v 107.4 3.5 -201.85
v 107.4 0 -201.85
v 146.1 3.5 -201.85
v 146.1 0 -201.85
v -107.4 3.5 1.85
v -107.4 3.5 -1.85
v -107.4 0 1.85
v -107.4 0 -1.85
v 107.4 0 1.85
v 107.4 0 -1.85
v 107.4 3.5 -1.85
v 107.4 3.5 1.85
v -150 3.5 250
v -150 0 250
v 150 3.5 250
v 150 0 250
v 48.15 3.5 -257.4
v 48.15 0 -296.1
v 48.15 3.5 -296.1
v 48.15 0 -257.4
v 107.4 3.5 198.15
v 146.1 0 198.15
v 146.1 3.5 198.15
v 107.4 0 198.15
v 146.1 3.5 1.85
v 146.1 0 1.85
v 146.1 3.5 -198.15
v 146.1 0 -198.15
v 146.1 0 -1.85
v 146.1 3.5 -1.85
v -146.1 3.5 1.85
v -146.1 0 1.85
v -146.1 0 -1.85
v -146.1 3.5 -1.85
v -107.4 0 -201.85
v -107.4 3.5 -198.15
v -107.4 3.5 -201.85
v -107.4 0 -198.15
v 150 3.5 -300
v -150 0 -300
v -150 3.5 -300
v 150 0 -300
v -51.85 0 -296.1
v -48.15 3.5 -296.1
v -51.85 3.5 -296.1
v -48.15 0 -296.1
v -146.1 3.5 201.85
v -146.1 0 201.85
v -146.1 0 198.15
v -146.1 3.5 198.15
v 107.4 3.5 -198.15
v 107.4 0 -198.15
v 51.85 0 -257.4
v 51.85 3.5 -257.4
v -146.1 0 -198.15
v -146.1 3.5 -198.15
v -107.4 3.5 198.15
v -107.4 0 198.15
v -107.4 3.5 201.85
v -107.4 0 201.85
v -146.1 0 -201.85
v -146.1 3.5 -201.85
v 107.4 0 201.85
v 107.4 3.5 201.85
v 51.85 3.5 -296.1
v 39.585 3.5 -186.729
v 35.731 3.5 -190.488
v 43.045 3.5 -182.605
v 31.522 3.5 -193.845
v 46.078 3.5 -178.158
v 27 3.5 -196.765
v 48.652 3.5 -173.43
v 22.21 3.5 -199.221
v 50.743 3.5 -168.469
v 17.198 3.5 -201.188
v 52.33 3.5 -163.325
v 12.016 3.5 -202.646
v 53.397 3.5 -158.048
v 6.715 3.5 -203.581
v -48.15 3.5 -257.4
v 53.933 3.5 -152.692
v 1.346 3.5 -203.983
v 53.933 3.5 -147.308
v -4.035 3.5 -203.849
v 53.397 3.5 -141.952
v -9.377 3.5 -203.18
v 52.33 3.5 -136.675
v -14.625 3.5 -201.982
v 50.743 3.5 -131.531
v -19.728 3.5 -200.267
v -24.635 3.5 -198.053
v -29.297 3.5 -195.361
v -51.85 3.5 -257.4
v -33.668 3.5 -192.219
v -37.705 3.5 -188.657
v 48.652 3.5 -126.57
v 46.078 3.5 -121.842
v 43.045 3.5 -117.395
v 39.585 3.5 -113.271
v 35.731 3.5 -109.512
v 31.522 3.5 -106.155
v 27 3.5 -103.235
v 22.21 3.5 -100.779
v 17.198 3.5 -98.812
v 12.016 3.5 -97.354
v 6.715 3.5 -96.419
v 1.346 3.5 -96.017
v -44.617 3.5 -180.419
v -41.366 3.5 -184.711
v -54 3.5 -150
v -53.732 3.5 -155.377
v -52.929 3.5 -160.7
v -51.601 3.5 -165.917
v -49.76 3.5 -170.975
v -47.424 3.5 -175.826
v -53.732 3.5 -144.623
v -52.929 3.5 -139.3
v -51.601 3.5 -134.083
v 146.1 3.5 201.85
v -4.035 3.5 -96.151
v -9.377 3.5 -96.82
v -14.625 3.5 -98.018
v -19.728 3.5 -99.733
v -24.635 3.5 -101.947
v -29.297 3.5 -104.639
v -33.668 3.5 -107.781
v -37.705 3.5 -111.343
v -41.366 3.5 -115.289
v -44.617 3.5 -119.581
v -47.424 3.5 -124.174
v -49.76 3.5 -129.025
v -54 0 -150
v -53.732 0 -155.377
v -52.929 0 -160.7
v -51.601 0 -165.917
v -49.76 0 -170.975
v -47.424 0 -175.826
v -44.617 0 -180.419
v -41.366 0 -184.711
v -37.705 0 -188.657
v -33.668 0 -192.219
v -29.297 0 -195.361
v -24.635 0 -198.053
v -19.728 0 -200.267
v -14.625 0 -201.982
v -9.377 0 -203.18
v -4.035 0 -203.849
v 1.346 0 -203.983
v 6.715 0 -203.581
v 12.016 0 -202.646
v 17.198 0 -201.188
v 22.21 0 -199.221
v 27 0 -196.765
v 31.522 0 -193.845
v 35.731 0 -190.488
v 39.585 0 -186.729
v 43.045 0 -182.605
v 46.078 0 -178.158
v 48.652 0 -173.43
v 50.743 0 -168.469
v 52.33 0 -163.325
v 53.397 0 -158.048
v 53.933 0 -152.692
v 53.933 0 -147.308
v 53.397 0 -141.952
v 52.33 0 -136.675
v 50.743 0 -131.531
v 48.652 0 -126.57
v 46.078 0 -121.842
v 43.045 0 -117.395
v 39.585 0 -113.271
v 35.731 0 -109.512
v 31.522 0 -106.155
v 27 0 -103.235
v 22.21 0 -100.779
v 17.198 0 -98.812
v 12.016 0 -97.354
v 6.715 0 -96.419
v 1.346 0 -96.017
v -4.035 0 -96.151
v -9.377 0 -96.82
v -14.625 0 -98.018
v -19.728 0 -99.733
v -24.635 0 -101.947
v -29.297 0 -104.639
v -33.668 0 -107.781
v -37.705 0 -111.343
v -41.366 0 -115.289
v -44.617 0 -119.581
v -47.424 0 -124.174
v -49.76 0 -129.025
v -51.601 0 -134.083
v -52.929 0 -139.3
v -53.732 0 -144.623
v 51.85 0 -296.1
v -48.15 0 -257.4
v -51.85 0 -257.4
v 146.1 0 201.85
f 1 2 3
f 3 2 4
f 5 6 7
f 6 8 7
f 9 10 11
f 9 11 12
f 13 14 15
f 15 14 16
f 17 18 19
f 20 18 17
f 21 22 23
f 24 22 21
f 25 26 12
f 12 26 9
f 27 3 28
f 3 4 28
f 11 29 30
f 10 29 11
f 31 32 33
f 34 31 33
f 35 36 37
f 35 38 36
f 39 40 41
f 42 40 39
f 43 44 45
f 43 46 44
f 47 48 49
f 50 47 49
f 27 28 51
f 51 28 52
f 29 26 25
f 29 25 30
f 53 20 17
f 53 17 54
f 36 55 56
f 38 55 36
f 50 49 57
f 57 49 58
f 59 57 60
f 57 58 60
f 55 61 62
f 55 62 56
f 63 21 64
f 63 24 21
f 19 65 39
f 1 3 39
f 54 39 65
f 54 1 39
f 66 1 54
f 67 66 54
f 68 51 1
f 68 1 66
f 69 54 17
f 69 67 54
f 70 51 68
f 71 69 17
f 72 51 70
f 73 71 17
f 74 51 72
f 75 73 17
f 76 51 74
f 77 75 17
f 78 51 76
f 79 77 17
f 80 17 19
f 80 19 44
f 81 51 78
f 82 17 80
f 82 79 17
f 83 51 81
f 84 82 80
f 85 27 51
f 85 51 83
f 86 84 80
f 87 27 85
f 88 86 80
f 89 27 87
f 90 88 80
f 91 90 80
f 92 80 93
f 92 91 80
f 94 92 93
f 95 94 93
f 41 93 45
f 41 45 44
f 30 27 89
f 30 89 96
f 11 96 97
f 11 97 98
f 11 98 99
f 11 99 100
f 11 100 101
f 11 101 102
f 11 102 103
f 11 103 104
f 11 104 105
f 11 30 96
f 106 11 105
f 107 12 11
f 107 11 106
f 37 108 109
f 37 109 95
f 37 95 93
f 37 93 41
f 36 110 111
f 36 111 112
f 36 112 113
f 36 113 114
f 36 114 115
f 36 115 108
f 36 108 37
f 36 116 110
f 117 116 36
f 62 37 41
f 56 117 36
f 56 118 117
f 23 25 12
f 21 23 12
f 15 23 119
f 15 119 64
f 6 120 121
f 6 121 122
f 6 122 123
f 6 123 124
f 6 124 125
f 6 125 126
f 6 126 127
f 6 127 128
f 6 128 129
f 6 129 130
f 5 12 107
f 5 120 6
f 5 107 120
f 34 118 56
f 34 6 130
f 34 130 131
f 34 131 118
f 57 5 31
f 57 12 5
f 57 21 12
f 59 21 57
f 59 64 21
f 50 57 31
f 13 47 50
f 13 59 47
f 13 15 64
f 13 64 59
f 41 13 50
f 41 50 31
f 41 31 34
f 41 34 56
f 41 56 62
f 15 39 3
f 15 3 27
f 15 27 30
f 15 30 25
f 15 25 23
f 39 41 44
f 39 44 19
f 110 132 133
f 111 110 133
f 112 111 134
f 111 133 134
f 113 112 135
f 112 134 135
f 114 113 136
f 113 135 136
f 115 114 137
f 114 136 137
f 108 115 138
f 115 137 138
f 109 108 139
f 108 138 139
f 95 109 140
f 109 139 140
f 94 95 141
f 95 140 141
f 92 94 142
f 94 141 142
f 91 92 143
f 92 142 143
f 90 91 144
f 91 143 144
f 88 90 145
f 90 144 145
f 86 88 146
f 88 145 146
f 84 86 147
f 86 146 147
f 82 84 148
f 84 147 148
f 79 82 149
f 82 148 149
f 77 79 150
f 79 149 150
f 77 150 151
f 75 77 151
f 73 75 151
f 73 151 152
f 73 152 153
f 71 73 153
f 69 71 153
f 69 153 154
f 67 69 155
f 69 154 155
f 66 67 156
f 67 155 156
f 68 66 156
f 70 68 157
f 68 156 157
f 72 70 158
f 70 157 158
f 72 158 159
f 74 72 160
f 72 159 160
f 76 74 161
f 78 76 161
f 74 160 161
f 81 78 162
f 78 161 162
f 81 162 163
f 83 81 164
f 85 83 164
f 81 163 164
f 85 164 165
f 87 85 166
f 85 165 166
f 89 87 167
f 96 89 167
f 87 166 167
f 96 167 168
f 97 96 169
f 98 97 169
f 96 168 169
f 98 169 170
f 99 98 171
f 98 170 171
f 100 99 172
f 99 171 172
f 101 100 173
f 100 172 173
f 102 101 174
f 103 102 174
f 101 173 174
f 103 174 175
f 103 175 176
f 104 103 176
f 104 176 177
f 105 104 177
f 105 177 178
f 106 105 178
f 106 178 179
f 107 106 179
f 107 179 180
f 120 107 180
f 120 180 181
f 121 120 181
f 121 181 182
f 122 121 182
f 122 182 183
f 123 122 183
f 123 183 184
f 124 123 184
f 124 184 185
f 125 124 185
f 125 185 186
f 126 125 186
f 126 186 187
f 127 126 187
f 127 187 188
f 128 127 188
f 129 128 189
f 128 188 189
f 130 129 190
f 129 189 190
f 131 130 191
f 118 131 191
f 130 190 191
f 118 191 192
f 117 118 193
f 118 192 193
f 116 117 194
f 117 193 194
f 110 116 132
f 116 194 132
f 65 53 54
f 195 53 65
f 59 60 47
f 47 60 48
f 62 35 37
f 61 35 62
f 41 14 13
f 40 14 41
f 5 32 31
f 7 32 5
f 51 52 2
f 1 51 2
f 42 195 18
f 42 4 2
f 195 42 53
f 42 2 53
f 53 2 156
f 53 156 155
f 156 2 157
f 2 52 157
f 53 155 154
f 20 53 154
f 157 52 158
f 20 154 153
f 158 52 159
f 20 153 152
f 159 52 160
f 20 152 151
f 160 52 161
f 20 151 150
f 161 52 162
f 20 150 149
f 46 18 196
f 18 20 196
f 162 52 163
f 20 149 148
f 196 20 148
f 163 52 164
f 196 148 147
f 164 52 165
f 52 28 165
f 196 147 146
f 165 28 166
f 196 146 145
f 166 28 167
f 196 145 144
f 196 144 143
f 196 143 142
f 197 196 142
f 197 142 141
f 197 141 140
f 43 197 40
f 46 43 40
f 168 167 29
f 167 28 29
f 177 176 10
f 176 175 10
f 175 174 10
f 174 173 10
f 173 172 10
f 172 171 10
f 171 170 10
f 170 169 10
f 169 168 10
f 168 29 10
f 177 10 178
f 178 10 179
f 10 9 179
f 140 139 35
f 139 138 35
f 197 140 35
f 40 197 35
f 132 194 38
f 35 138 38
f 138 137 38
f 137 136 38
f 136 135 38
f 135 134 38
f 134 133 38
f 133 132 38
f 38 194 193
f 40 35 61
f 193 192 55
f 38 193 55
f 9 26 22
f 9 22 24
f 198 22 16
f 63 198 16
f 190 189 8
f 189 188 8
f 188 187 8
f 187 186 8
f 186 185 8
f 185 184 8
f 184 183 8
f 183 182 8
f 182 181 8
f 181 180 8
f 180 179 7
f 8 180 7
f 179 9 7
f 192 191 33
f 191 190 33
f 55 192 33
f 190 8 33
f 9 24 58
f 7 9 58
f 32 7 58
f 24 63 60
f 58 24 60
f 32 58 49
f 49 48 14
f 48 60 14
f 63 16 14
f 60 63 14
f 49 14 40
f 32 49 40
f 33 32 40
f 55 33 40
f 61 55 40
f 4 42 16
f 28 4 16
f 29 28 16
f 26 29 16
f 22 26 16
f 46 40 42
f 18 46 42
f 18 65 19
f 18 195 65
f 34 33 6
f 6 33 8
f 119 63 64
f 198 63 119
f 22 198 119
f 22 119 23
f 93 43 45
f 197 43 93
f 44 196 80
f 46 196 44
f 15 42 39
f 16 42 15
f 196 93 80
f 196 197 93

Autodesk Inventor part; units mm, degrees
ref_plane "YZ Plane" through (0, 0, 0) normal (1, 0, 0) x (0, 1, 0)
ref_plane "XZ Plane" through (0, 0, 0) normal (0, 1, 0) x (-1, 0, 0)
ref_plane "XY Plane" through (0, 0, 0) normal (0, 0, 1) x (1, 0, 0)
sketch "스케치1" plane through (0, 0, 0) normal (0, 1, 0) x (-1, 0, 0)
  line L0 (150, 0) -> (150, -250)
  line L1 (150, -250) -> (0, -250) construction
  line L2 (210, 0) -> (-210, 0) projected
  line L3 (0, -410) -> (0, 360) projected
  line L4 (100, 0) -> (100, -250) construction
  line L5 (107.4, -198.15) -> (107.4, -201.85)
  line L6 (107.4, -201.85) -> (146.1, -201.85)
  line L7 (146.1, -198.15) -> (107.4, -198.15)
  line L8 (146.1, -201.85) -> (146.1, -198.15)
  line L9 (146.1, 0) -> (146.1, -1.85)
  line L10 (146.1, -1.85) -> (107.4, -1.85)
  line L11 (107.4, -1.85) -> (107.4, 0)
  line L12 (150, 0) -> (150, 250)
  line L13 (150, 250) -> (0, 250)
  line L14 (100, 0) -> (100, 250) construction
  line L15 (146.1, 198.15) -> (107.4, 198.15)
  line L16 (146.1, 201.85) -> (146.1, 198.15)
  line L17 (107.4, 201.85) -> (146.1, 201.85)
  line L18 (107.4, 198.15) -> (107.4, 201.85)
  line L19 (146.1, 0) -> (146.1, 1.85)
  line L20 (146.1, 1.85) -> (107.4, 1.85)
  line L21 (107.4, 1.85) -> (107.4, 0)
  line L22 (-150, 0) -> (-150, -250)
  line L23 (-150, -250) -> (0, -250) construction
  line L24 (-100, 0) -> (-100, -250) construction
  line L25 (-146.1, -198.15) -> (-107.4, -198.15)
  line L26 (-146.1, -201.85) -> (-146.1, -198.15)
  line L27 (-107.4, -201.85) -> (-146.1, -201.85)
  line L28 (-107.4, -198.15) -> (-107.4, -201.85)
  line L29 (-146.1, 0) -> (-146.1, -1.85)
  line L30 (-146.1, -1.85) -> (-107.4, -1.85)
  line L31 (-107.4, -1.85) -> (-107.4, 0)
  line L32 (-146.1, 1.85) -> (-107.4, 1.85)
  line L33 (-146.1, 0) -> (-146.1, 1.85)
  line L34 (-107.4, 1.85) -> (-107.4, 0)
  line L35 (-100, 0) -> (-100, 250) construction
  line L36 (-150, 0) -> (-150, 250)
  line L37 (-146.1, 198.15) -> (-107.4, 198.15)
  line L38 (-107.4, 198.15) -> (-107.4, 201.85)
  line L39 (-146.1, 201.85) -> (-146.1, 198.15)
  line L40 (-107.4, 201.85) -> (-146.1, 201.85)
  line L41 (-150, 250) -> (0, 250)
  line L42 (150, -250) -> (150, -300)
  line L43 (150, -300) -> (-150, -300)
  line L44 (-150, -300) -> (-150, -250)
  line L45 (51.85, -257.4) -> (48.15, -257.4)
  line L46 (48.15, -257.4) -> (48.15, -296.1)
  line L47 (48.15, -296.1) -> (51.85, -296.1)
  line L48 (51.85, -296.1) -> (51.85, -257.4)
  line L49 (-48.15, -257.4) -> (-51.85, -257.4)
  line L50 (-51.85, -257.4) -> (-51.85, -296.1)
  line L51 (-51.85, -296.1) -> (-48.15, -296.1)
  line L52 (-48.15, -296.1) -> (-48.15, -257.4)
  circle A0 centre (0, -150) radius 54
  point P0 (0, 0)
  point P1 (-50, -257.4)
  point P2 (-150, -275)
  point P3 (-51.85, -276.75)
  dimension "d2" = 250
  dimension "d3" = 150
  dimension "d4" = 50
  dimension "d13" = 38.7
  dimension "d14" = 3.7
  dimension "d15" = 48.15
  dimension "d16" = 1.85
  dimension "d17" = 38.7
  dimension "d18" = 7.4
  dimension "d19" = 7.4
  dimension "d20" = 50
  dimension "d21" = 3.7
  dimension "d22" = 38.7
  dimension "d23" = 7.4
  dimension "d24" = 98.15
  dimension "d25" = 38.7
  dimension "d26" = 3.7
  dimension "d27" = 7.4
  dimension "d28" = 98.15
  dimension "d29" = 108
  dimension "d30" = 100
extrude "돌출1" add sketch "스케치1" along normal blind 3.5 contours L0 L42 L43 L3 A0 L2 L11 L10 L9 | L2 L19 L20 L21 L3 L13 L12 | L3 L2 L34 L32 L33 L36 L41 | L43 L44 L22 L2 L29 L30 L31 L3 A0
sketch "스케치5" plane through (0, 3.5, 0) normal (0, 1, 0) x (1, 0, 0)
  point P0 (0, 0)
properties part number "부품1"
